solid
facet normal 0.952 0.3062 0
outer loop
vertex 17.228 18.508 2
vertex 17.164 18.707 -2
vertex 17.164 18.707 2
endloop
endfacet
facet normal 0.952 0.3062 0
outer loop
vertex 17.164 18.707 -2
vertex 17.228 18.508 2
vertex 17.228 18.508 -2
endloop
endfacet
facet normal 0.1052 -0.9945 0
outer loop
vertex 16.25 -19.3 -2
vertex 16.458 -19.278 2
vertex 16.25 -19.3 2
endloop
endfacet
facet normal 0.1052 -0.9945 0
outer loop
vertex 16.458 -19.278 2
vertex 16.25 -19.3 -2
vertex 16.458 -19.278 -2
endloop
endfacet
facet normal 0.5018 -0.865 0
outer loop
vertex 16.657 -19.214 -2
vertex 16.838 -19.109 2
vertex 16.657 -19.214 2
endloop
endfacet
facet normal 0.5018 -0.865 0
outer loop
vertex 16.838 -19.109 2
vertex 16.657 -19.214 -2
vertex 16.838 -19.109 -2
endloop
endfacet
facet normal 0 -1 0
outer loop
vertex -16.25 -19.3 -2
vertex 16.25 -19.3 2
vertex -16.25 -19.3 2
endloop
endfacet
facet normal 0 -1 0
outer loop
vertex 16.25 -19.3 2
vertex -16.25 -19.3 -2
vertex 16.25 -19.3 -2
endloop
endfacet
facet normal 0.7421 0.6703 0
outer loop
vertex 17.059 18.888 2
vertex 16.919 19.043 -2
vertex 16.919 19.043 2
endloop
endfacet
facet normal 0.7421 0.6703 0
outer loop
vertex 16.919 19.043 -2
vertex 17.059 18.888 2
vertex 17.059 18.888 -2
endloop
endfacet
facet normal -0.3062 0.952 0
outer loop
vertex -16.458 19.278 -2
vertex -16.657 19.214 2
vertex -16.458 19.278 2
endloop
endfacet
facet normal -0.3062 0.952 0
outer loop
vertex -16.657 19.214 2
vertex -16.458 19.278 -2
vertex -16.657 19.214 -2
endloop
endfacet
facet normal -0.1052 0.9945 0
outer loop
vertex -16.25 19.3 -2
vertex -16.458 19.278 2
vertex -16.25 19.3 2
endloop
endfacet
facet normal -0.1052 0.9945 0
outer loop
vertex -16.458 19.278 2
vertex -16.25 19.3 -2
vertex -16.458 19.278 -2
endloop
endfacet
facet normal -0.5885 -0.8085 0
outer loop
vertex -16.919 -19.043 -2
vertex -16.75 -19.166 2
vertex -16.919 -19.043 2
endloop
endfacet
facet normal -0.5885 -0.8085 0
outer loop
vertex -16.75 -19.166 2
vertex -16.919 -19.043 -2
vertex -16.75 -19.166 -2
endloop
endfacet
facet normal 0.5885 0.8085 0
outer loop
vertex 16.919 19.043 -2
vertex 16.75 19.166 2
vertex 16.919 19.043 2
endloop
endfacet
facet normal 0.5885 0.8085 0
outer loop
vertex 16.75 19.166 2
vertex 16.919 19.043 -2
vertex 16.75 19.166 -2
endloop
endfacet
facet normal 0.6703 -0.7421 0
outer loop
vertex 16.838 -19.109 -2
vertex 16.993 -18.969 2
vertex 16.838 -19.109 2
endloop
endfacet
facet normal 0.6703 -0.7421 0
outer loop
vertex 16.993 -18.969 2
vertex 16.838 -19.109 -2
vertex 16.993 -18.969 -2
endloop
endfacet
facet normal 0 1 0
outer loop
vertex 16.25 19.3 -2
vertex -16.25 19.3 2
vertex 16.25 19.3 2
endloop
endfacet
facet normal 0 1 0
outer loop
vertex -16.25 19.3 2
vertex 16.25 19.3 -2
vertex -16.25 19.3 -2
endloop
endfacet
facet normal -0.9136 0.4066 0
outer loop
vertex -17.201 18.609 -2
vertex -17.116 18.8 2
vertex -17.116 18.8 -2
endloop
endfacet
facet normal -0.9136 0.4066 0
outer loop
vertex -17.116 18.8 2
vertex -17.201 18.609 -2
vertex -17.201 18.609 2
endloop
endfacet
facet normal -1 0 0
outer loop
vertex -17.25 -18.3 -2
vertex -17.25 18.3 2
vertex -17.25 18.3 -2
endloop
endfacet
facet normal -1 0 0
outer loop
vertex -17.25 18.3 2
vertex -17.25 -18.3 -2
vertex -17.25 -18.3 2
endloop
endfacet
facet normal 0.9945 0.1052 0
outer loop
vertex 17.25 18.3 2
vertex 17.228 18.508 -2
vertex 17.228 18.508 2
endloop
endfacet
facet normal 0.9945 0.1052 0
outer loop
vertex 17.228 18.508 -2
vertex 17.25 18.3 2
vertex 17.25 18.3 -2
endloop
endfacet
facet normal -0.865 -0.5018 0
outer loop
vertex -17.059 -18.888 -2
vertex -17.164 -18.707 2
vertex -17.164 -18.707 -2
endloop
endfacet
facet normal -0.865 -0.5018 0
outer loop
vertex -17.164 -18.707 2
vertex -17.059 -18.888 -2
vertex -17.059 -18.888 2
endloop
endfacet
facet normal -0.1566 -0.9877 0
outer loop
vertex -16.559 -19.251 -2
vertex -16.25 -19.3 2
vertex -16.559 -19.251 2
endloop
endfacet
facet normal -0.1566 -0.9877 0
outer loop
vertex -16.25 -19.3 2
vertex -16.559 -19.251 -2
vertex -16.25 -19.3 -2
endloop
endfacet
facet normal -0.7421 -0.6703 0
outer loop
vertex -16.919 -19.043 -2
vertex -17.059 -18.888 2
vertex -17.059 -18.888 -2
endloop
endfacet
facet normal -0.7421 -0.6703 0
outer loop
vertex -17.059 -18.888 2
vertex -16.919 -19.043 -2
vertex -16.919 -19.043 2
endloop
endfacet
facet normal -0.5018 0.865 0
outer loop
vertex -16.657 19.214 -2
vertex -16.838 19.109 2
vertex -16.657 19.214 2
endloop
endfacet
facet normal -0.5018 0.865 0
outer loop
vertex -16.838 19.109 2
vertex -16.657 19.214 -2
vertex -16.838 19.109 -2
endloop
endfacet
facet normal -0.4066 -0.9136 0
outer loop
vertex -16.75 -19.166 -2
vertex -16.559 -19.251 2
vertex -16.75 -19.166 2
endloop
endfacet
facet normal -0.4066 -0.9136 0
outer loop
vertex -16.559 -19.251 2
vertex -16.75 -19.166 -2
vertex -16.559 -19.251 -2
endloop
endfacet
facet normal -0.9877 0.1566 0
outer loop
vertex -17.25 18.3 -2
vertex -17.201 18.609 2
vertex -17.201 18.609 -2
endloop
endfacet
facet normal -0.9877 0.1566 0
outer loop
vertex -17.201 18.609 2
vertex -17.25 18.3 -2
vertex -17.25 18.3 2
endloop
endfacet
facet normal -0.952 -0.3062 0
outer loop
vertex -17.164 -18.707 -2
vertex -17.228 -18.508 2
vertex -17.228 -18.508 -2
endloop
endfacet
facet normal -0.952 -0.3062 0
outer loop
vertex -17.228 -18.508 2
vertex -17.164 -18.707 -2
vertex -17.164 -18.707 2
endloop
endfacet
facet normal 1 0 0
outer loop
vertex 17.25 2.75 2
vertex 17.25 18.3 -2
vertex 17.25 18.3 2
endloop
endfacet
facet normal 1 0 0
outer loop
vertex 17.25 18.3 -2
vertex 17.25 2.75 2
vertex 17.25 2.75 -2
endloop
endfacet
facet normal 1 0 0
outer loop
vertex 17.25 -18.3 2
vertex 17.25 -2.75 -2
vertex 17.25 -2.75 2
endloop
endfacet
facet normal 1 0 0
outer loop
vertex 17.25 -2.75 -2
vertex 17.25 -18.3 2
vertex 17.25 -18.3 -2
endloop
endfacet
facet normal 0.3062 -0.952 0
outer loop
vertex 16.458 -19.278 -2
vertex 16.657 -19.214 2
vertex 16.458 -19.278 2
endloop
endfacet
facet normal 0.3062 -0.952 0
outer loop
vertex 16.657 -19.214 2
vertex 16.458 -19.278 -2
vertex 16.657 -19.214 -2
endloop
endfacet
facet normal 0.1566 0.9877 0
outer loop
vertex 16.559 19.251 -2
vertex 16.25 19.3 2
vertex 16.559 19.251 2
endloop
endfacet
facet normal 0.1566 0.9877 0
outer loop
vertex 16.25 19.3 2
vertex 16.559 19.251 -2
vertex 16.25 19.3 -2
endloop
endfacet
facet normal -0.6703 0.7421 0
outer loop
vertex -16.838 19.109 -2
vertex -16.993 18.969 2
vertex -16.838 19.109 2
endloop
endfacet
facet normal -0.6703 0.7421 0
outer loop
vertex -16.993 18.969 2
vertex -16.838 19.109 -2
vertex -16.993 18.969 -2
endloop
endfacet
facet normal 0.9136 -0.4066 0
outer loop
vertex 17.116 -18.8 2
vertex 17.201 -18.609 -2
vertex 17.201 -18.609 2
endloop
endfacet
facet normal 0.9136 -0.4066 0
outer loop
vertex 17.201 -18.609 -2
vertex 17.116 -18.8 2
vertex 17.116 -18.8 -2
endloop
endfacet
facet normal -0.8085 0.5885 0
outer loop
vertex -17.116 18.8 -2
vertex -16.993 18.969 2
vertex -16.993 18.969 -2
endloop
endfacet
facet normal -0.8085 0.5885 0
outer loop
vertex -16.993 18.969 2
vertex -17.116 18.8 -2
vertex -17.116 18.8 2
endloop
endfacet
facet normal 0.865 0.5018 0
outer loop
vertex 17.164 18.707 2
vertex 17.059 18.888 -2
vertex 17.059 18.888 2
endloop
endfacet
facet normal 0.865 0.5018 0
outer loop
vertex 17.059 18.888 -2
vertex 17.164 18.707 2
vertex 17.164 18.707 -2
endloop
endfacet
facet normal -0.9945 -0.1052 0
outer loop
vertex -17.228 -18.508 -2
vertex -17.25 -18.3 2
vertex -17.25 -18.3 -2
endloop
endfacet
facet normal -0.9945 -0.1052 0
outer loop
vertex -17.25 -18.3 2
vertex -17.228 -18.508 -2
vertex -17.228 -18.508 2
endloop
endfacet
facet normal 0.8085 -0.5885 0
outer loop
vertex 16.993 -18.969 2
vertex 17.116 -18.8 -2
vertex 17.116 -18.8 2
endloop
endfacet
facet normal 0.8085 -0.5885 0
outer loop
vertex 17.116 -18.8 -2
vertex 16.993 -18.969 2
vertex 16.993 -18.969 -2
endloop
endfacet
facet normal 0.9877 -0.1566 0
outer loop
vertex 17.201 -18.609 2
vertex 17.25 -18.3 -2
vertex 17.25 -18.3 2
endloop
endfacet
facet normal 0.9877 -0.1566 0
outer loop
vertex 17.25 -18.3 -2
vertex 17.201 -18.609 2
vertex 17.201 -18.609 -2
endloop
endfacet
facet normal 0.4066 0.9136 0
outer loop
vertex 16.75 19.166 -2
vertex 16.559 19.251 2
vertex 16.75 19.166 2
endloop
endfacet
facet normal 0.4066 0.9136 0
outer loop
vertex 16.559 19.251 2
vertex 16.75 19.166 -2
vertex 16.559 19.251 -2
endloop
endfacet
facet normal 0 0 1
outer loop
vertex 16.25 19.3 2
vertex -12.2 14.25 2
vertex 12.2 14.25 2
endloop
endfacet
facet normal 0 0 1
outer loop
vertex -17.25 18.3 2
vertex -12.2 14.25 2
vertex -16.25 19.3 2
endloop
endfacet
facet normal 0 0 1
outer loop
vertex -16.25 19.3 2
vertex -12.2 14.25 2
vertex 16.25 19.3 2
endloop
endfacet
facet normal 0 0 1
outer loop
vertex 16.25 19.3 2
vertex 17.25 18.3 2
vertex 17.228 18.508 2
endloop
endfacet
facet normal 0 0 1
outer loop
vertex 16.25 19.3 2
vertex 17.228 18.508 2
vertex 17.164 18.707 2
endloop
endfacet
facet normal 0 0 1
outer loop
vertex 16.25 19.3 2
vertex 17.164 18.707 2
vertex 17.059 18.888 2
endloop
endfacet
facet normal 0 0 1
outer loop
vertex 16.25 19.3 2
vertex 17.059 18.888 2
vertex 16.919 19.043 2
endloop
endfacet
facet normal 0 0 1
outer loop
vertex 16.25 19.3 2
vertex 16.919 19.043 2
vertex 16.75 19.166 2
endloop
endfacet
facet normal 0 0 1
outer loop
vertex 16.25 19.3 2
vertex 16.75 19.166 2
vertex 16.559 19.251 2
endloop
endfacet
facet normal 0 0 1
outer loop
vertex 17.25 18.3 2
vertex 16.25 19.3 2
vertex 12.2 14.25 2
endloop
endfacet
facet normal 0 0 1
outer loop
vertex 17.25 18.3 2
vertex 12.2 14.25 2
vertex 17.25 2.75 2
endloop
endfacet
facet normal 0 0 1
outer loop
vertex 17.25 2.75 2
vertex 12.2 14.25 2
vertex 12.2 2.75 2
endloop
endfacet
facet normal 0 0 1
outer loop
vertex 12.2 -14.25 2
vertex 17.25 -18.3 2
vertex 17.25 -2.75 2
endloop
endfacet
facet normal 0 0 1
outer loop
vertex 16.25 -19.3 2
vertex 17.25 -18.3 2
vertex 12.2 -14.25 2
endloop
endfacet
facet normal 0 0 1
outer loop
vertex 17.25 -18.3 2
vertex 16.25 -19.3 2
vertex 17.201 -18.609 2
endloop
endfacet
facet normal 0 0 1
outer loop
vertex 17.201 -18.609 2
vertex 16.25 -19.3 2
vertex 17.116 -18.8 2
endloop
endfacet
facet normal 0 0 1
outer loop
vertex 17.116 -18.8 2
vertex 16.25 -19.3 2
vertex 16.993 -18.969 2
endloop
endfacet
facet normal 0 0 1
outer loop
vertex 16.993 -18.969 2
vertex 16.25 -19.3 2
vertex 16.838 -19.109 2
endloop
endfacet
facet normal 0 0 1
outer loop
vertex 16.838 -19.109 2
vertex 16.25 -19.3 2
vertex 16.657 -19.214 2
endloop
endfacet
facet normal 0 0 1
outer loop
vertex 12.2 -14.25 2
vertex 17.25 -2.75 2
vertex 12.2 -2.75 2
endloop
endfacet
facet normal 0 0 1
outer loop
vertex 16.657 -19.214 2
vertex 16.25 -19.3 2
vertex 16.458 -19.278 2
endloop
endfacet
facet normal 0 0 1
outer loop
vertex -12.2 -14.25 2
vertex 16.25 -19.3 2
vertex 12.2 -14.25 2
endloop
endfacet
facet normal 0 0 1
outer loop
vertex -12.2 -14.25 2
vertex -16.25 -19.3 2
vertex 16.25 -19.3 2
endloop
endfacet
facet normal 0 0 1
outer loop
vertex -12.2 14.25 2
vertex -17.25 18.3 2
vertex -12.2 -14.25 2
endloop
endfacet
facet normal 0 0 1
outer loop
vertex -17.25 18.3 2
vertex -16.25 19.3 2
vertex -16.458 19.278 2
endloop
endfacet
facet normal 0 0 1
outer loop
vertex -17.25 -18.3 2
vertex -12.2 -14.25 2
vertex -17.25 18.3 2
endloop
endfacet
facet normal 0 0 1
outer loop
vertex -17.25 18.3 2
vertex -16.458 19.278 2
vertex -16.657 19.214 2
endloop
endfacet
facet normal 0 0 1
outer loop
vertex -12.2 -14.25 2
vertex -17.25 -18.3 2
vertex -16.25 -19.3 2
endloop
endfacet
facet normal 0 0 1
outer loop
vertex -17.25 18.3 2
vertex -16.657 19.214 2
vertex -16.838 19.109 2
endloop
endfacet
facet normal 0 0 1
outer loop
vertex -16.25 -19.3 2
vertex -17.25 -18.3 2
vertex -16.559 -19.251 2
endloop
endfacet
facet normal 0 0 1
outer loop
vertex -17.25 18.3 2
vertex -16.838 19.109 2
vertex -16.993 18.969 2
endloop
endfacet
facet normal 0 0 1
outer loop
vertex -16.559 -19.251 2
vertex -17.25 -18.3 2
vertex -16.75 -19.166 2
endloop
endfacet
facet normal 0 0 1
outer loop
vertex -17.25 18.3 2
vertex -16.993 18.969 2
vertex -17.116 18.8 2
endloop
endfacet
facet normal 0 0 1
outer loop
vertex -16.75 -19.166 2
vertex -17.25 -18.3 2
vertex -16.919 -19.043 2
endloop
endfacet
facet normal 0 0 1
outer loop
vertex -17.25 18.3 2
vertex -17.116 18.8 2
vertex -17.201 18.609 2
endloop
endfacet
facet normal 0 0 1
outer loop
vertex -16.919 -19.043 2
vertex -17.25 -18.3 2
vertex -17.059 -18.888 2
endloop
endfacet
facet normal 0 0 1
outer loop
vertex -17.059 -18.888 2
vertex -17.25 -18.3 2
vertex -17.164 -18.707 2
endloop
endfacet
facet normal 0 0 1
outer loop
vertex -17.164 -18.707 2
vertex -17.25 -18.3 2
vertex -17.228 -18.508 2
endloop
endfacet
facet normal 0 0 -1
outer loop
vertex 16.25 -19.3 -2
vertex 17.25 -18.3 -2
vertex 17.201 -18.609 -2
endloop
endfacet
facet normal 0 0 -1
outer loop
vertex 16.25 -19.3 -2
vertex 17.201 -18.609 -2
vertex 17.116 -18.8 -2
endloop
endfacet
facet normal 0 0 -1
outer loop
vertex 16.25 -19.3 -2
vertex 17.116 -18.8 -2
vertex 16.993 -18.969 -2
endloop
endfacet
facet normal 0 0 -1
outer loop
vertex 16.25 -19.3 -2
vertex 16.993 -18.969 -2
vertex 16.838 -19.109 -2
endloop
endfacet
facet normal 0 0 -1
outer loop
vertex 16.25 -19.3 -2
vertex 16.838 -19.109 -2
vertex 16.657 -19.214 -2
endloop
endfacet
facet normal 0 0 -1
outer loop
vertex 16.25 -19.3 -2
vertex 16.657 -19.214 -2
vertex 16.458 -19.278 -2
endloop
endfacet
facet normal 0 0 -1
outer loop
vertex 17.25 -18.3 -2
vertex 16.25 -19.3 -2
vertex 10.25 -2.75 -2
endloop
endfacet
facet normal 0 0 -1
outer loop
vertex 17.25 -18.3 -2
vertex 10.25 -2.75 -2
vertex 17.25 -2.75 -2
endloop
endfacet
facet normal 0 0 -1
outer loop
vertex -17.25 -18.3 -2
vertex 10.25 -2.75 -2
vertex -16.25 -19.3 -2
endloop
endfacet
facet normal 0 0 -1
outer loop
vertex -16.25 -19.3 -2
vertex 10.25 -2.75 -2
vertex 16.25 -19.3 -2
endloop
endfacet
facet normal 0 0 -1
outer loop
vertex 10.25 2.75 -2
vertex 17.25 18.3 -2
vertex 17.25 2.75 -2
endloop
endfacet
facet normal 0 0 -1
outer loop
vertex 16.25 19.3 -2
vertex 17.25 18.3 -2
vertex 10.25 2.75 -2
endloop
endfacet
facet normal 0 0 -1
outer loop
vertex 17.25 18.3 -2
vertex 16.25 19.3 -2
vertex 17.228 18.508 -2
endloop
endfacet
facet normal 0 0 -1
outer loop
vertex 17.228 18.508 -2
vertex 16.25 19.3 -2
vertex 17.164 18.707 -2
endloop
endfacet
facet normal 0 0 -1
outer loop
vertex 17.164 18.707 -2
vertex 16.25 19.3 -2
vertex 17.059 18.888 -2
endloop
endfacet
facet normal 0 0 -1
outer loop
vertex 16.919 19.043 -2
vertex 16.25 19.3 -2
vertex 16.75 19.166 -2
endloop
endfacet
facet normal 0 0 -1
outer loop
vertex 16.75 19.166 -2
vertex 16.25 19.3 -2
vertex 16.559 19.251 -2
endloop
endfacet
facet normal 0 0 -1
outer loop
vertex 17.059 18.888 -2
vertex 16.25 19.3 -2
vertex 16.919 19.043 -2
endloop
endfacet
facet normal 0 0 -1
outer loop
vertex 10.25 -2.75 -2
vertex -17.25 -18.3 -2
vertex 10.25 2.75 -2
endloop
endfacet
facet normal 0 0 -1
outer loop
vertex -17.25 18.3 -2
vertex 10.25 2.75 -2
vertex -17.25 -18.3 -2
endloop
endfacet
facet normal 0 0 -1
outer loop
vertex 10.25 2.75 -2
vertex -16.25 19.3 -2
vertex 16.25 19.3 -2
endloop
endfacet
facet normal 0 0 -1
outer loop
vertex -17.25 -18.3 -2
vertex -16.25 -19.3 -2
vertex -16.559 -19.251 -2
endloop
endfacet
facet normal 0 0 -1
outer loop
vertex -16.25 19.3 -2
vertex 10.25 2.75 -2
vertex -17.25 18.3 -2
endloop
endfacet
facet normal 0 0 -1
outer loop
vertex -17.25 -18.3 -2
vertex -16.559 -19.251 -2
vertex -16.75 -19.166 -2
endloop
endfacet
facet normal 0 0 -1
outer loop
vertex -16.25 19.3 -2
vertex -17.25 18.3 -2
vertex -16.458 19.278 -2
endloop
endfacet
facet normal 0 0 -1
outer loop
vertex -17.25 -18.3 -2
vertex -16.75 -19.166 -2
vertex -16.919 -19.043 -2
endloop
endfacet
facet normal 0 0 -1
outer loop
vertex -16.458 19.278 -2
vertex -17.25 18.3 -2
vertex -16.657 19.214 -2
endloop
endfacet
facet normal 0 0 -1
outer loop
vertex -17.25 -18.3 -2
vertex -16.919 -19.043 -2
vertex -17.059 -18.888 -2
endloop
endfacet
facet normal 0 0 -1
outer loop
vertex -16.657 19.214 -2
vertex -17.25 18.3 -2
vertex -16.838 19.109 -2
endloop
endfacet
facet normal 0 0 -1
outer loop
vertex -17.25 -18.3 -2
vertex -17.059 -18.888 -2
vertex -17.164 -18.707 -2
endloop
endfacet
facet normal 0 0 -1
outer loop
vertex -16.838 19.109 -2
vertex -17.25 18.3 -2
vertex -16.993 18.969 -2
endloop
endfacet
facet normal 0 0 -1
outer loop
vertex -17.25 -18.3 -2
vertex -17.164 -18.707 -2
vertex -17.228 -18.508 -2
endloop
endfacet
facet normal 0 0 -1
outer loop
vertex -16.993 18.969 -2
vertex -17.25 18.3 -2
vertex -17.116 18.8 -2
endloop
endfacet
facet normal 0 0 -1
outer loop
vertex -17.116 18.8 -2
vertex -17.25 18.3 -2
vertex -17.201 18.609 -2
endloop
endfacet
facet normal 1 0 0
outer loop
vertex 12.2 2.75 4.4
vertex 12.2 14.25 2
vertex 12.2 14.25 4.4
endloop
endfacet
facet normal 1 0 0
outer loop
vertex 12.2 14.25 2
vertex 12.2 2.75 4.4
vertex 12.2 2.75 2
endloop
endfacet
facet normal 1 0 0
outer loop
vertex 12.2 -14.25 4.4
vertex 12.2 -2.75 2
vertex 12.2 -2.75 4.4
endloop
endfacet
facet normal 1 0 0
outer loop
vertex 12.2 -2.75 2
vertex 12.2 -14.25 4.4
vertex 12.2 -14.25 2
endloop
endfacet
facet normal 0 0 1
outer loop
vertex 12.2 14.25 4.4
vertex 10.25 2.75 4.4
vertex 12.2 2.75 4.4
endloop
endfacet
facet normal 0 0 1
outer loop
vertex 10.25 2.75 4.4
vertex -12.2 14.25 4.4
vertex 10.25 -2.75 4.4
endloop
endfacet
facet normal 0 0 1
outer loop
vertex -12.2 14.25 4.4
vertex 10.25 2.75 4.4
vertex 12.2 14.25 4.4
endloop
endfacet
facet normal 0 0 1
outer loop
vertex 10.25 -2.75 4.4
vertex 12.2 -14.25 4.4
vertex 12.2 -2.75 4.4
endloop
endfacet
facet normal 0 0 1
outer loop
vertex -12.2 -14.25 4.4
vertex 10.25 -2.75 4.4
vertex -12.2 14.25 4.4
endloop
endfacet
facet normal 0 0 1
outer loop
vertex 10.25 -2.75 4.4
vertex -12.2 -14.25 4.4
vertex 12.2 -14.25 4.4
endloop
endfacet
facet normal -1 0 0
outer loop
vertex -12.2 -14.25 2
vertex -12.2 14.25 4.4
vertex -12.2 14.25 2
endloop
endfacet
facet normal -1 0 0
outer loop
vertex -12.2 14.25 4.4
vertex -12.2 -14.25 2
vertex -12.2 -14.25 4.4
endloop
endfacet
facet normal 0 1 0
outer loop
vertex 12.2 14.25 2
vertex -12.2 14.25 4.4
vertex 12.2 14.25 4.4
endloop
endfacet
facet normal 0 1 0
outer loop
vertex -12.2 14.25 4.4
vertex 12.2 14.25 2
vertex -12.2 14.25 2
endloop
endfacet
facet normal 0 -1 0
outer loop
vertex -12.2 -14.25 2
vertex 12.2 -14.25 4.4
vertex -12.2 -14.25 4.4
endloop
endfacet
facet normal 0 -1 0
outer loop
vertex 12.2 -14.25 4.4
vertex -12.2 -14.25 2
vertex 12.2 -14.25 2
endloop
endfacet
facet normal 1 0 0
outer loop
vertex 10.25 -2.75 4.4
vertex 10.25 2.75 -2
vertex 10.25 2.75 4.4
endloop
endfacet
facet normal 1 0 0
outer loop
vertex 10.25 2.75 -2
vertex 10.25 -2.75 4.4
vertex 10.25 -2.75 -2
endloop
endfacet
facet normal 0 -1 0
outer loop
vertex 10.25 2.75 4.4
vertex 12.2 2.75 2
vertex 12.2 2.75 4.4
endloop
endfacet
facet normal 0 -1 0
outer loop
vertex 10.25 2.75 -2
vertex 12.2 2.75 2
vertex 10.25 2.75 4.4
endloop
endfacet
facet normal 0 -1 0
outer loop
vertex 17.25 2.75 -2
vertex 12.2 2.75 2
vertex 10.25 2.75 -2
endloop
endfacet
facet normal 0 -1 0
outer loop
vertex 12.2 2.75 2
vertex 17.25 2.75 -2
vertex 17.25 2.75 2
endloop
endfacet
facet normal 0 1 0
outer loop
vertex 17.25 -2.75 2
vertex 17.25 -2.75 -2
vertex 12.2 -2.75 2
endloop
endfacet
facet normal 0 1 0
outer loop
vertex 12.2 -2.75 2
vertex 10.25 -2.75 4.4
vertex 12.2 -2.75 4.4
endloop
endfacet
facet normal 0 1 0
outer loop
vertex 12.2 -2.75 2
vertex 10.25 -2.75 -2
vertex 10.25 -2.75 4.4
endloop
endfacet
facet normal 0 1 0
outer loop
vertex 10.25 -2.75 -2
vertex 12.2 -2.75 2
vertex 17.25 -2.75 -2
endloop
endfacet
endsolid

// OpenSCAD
use <myTools.scad>
$fn=100;

FUDGE = [ .5, .5, 10 ]; // really thick pcb to punch thru the top

WALL=5;

xPCB= [26, 30.1, 1.1]; //real dims
PCB = xPCB + FUDGE;

GROVE_X= (9 - 5.70)/2; // GROVE conn not on center :P


BLOCK = [ 11, 3, 6];


HEIGHT = 25.4;
NOTCH_IN=2;

// the inside of the box is tighter than the PCB
// to make the PCB click inot postion.

INSIDE= PCB - [ NOTCH_IN, NOTCH_IN, -HEIGHT];
//----------------------------------------------------

module make_box()
{
 
    color("PINK", .9)//

    difference()
    {
        abox_punch(INSIDE, WALL, round_out=1, true);
        
        translate([ 0, 0, HEIGHT/2 + 9])
        {
            cube(PCB, true);
        
            translate([ GROVE_X, xPCB.y/2 + BLOCK.y/4 -.5, -8])
            #cube(BLOCK, true);
        }
    }
}

//-----------------------------------------------------

module make_lid(LID_THICK=2, bHasCable = false)
{
    LID= [INSIDE.x + WALL*2 -2, INSIDE.y + WALL*2 -2, LID_THICK];

    difference()
    {
        union()
        {
            abox(LID, 1, bSolid = true, round_out=1, true);
            translate([ 0, 0, LID_THICK -.1])
            cube([INSIDE.x-.1, INSIDE.y-.1, LID_THICK], true);
            #cube([xPCB.x + .25, xPCB.y + .25, LID_THICK], true);
        }
        if (bHasCable)
        {
            WIRE= [ 7+3, 5.5, 20 ];
            translate([INSIDE.x/2 + 3,0, 0])
            #cube( WIRE, true);
        }
    }
}
//-----------------------------------------------------

//make_lid(LID_THICK=2, bHasCable=false);
//translate([ 0, 50, 0 ])
make_lid(LID_THICK=3, bHasCable=true);
